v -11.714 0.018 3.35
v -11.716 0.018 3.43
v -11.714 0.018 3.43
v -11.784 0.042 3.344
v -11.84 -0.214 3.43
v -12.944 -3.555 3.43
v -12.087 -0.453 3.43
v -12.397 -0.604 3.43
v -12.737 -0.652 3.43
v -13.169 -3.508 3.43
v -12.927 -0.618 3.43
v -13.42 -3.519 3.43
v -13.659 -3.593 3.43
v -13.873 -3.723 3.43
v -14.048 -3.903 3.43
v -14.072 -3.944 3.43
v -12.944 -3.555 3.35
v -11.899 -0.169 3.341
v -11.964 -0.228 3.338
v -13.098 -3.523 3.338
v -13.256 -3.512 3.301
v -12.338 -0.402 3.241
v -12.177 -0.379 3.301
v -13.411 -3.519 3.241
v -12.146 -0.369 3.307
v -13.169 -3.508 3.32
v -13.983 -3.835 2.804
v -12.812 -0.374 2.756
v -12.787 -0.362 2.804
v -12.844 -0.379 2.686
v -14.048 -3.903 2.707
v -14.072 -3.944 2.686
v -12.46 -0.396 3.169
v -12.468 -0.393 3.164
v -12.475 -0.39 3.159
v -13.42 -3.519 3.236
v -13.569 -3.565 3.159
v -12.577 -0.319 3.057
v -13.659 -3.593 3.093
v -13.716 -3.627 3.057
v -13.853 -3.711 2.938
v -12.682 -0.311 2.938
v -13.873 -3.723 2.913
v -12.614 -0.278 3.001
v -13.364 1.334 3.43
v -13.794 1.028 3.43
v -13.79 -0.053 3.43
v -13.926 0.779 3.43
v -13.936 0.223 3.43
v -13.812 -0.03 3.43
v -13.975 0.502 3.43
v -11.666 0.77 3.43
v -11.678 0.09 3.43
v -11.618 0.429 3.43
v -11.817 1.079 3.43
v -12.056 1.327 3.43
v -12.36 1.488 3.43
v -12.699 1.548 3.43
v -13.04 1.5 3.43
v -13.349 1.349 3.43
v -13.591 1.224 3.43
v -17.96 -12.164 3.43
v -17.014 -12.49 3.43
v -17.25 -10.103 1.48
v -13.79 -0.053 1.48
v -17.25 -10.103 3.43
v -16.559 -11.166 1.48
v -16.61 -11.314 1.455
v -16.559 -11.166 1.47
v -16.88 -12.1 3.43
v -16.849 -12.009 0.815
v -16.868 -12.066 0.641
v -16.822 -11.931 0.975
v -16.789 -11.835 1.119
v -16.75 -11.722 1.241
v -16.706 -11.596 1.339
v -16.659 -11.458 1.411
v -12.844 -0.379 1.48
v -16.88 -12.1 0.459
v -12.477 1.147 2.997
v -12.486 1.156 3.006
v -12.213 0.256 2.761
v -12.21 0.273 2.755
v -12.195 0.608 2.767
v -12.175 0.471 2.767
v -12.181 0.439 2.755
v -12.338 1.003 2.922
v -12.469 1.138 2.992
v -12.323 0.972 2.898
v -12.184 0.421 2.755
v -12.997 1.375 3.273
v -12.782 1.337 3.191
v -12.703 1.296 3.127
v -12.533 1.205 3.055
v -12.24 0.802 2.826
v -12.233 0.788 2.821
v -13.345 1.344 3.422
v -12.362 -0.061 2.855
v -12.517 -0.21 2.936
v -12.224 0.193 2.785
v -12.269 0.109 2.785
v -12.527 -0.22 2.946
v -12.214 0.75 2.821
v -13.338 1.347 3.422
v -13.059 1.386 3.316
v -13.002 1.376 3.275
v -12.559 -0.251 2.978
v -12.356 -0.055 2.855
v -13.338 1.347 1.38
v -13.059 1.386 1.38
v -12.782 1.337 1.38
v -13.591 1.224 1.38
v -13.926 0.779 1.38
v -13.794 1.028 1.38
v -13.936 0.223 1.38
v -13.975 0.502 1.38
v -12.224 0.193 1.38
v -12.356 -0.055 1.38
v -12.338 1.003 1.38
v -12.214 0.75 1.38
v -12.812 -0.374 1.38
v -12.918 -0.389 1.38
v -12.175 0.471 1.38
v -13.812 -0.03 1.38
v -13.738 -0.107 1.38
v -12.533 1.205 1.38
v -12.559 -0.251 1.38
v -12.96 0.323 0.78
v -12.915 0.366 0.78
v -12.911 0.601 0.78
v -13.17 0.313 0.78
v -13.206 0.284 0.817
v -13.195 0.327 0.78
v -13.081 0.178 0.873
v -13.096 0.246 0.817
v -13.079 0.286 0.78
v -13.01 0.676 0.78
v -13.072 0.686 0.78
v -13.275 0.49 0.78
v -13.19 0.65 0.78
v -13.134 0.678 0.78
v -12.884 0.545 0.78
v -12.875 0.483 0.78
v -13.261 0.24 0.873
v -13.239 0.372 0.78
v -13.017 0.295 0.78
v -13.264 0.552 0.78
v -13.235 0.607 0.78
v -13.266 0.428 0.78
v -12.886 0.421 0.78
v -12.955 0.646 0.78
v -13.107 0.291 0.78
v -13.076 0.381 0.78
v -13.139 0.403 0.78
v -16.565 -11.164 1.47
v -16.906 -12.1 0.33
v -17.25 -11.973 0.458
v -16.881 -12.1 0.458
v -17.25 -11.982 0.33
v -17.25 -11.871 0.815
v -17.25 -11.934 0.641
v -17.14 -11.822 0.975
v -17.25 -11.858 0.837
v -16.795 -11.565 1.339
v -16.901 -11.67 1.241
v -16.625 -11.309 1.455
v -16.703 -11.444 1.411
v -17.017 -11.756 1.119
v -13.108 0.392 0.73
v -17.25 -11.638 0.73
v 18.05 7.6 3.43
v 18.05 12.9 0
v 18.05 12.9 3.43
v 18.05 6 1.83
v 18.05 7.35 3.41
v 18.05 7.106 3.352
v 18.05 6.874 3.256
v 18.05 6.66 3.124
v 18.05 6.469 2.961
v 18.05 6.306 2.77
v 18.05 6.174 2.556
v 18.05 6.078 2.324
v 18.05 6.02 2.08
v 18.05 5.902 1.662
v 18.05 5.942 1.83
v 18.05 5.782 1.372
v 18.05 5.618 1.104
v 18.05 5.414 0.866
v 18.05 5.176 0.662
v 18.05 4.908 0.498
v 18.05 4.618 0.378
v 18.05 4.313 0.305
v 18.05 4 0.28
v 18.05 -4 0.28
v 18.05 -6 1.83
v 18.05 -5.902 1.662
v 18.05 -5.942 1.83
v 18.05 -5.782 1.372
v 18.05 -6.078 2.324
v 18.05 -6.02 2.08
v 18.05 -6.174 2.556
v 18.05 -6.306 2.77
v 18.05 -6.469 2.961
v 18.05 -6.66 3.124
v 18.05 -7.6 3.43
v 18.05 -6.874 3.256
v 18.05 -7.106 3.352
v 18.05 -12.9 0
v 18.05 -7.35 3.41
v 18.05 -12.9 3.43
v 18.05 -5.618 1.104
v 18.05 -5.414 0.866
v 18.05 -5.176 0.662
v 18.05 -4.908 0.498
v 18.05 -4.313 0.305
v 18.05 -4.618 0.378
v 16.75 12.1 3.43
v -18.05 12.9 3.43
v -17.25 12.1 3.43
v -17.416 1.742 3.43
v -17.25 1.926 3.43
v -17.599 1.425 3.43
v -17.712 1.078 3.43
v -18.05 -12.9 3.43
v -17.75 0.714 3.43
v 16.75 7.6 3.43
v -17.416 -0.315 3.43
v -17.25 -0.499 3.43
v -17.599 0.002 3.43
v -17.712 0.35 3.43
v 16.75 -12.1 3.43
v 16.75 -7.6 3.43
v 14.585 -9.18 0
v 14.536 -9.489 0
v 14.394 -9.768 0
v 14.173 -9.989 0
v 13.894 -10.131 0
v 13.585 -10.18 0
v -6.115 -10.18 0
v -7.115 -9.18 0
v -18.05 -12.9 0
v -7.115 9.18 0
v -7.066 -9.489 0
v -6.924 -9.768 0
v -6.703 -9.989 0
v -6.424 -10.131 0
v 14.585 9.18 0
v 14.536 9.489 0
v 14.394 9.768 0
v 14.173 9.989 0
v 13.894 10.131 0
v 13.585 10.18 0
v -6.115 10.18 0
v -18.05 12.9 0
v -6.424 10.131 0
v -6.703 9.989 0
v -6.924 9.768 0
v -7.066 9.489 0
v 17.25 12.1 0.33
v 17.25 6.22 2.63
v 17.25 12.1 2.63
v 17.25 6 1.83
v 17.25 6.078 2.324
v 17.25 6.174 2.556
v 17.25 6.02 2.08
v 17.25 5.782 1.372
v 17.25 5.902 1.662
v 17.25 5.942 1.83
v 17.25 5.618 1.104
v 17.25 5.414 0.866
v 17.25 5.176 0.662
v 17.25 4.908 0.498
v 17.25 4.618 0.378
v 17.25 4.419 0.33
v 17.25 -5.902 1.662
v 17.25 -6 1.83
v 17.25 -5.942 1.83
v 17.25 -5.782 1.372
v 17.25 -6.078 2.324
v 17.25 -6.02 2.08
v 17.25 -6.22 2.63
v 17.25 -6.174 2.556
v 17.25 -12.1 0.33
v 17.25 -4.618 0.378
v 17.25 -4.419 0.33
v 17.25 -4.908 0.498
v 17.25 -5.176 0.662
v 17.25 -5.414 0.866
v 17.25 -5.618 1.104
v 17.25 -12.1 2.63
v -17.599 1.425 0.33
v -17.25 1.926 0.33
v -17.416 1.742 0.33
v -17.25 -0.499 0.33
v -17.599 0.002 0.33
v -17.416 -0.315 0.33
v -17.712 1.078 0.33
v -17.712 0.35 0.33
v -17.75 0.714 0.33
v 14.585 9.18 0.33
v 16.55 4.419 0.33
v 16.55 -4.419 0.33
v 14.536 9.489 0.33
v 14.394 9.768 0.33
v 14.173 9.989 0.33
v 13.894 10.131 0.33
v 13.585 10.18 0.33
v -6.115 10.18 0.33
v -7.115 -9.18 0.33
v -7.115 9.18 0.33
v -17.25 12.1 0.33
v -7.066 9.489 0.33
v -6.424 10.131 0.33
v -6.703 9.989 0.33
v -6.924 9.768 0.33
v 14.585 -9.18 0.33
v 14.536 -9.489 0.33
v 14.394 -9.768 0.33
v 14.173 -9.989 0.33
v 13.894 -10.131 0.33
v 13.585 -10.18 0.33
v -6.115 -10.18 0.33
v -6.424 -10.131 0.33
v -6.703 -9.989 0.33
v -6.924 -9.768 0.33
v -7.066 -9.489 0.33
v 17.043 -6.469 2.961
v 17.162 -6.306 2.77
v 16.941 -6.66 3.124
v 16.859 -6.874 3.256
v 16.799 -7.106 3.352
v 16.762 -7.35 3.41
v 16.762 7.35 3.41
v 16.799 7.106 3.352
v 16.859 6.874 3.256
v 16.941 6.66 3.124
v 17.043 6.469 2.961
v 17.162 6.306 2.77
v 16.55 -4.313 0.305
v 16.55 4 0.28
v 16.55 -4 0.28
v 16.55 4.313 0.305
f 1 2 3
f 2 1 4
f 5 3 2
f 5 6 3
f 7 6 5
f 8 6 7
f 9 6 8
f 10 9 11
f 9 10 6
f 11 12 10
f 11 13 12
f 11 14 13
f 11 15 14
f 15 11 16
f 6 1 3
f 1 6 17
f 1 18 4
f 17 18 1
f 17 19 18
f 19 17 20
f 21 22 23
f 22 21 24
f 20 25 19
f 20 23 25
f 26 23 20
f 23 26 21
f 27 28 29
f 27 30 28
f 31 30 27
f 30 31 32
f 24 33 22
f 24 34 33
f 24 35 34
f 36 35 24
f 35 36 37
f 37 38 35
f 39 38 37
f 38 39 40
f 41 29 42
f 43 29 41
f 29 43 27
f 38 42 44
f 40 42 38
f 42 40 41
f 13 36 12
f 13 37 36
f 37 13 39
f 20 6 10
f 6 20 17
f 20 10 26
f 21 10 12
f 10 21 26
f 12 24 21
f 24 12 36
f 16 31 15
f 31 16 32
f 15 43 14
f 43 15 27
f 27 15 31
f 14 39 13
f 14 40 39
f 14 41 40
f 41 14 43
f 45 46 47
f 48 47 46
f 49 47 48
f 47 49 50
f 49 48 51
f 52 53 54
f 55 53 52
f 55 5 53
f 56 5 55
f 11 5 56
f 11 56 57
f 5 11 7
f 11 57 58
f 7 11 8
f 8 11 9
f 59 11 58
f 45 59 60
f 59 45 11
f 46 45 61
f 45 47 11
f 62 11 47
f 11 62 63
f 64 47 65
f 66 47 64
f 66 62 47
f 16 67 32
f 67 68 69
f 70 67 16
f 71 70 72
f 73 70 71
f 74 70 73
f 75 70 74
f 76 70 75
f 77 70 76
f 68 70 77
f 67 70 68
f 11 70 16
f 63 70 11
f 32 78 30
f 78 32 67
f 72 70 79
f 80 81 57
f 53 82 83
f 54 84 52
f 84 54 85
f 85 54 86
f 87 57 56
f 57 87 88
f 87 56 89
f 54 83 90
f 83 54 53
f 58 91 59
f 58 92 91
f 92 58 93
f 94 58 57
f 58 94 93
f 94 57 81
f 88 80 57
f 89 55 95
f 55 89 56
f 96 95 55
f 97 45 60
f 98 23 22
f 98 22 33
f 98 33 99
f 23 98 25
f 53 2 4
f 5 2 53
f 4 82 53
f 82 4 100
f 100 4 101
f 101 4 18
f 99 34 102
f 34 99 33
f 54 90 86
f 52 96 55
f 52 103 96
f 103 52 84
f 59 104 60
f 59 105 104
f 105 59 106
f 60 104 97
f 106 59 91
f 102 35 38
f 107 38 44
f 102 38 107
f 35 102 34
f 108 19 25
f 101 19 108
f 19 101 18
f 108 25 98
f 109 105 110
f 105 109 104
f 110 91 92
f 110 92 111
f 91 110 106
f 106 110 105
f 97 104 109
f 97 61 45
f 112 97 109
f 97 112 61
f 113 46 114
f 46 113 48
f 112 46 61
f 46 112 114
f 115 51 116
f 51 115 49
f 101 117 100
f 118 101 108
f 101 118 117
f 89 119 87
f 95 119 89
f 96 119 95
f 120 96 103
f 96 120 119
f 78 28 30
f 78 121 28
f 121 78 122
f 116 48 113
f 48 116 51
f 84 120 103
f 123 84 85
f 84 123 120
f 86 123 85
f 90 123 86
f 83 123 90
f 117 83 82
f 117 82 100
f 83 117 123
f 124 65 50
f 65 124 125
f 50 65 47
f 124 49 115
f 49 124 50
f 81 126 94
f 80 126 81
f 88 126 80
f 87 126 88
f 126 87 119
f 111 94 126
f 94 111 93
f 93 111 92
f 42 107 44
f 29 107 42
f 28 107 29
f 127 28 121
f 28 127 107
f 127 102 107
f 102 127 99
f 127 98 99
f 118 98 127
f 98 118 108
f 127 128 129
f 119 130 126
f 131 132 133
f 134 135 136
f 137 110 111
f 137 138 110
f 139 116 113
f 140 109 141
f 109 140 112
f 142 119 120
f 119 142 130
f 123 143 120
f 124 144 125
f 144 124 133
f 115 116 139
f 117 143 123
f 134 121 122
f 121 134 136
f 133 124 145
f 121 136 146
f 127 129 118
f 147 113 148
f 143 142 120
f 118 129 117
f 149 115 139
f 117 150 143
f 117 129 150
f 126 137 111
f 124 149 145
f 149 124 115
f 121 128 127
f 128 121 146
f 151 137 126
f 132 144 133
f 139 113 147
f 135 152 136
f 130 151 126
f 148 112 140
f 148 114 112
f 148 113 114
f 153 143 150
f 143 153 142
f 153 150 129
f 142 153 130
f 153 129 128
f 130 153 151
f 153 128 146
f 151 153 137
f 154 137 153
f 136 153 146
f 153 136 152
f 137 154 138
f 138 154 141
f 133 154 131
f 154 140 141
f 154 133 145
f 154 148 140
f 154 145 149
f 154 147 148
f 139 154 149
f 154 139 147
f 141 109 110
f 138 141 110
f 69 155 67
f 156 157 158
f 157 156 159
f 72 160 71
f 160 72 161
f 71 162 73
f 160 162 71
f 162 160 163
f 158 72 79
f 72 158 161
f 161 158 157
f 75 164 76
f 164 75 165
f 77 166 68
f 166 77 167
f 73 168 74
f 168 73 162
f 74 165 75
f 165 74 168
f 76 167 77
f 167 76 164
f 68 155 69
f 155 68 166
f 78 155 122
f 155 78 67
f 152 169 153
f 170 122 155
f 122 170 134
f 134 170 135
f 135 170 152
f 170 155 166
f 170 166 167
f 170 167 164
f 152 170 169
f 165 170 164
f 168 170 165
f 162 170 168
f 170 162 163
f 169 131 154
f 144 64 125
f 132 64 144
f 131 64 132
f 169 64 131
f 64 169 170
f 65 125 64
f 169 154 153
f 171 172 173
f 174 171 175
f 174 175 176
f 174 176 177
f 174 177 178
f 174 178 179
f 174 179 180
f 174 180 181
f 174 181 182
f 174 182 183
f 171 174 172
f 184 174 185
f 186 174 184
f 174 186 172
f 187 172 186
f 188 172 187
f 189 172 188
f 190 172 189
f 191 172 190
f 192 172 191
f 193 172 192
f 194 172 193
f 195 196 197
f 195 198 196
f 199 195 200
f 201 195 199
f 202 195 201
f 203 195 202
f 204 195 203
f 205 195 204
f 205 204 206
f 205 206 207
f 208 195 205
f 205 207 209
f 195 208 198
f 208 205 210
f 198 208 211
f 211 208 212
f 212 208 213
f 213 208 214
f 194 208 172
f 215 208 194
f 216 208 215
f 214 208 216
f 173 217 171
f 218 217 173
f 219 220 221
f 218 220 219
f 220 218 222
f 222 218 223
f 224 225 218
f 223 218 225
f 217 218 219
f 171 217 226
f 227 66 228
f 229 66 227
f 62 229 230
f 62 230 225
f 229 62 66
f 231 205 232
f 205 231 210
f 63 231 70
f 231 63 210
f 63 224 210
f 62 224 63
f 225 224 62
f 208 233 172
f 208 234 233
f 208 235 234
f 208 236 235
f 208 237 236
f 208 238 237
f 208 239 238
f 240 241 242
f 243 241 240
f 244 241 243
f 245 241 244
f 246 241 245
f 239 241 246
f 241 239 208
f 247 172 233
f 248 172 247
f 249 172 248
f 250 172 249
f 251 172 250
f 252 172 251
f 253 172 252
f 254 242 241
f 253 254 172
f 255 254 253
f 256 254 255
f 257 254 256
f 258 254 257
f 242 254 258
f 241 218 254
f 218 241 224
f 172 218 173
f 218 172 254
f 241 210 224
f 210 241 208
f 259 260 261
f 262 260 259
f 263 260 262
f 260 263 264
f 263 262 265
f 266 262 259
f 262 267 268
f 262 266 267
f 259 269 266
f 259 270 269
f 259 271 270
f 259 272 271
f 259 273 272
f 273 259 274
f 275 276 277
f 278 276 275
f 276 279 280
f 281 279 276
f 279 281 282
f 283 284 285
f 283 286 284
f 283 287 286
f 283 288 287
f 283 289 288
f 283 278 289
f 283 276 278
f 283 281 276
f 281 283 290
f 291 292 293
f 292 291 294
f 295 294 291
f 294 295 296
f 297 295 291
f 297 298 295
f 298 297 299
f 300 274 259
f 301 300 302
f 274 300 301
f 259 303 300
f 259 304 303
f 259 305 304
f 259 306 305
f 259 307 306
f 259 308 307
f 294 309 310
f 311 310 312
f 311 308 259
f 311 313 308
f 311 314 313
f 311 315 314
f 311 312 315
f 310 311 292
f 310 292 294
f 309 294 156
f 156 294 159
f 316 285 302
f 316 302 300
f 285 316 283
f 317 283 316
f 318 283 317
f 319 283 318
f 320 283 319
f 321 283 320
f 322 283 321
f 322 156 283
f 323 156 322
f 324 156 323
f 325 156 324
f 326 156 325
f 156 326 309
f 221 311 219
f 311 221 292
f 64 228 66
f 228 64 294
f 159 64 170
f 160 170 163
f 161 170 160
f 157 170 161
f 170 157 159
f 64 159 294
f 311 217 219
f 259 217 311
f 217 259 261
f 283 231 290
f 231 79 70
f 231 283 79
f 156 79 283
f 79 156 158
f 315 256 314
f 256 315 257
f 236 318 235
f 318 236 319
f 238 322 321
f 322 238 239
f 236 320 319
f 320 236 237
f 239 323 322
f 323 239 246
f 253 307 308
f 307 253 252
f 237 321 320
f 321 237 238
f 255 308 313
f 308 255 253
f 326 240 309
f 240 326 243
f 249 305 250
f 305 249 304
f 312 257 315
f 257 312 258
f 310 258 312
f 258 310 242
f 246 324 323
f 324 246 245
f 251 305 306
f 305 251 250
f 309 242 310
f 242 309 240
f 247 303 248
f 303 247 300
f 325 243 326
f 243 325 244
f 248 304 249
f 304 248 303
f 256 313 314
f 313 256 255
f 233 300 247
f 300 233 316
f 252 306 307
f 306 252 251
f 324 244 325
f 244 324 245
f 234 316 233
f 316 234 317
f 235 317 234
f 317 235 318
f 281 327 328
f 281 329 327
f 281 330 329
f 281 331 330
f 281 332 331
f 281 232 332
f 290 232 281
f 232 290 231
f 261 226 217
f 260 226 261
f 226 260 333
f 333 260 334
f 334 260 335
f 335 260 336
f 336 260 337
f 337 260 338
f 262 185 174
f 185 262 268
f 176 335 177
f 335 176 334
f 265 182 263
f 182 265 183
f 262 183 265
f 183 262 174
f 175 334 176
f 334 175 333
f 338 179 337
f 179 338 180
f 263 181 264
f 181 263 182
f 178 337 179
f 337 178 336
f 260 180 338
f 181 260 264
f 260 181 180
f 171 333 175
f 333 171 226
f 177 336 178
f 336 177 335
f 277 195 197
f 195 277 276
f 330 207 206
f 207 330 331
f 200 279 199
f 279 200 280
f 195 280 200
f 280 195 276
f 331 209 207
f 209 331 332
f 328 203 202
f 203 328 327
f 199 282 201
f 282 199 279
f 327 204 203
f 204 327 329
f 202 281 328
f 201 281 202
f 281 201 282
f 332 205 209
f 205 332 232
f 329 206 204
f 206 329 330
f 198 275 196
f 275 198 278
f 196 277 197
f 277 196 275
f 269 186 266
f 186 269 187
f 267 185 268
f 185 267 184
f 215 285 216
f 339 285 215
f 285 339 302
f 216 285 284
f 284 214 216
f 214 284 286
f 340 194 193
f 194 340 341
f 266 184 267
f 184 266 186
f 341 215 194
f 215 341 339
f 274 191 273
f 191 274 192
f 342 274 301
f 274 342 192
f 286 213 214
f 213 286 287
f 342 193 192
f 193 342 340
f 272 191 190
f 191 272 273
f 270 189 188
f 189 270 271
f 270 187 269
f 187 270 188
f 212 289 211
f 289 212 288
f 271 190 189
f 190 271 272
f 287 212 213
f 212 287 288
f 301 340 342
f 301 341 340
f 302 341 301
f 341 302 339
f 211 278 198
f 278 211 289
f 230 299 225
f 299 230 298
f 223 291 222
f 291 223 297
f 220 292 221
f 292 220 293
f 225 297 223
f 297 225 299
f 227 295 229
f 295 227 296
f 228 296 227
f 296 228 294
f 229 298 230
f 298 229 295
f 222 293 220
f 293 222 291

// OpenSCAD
////////////////////////////////////////////////////////////////
// SD Card holder
// By Nuno João from https://EmbeddedDreams.com
// Released 2020 under Creative Commons 3.0
//
// This creates a compact SD card holder "box" with spring
// that can secure an SD card. Care was taken in order to
// make it work even when printing with low tolerances.
// See the end of the file for usage.
//

// Parameters. These defaults should cover all normal
// cases and there should be no need to change them
// unless you want to adapt for another card format
// or want ticher walls.

cSDCardDx = 32;
cSDCardDy = 24;
cSDCardDz = 2.1;
cSDCardGap = 0.2;           // Gap between card and holder
cSDCardPlanePad = 0.8;      // Exterior holder wall thickness
cZDetachGap = 0.40;         // Gap from spring to "ground"
cSDCardBackthickness = 0.28;
cSDCardSpringLen = 2.3;     // Distance between card top and holder wall, on spring side
cSpringLen = (cSDCardDy + cSDCardGap) * 0.56;
cSpringThickness = 1.0;
cSpringAngle = 19;

// Precalcs

cSDCardPocketDx = cSDCardDx + cSDCardSpringLen + cSDCardGap;
cSDCardPocketDy = cSDCardDy + cSDCardGap;
cSDCardPocketDz = cSDCardDz * 1.5;
cBlockDx = cSDCardPocketDx + 2 * cSDCardPlanePad;
cBlockDy = cSDCardPocketDy + 2 * cSDCardPlanePad;
cBlockDz = cSDCardPocketDz + cSDCardBackthickness;


function GetSDCardHolderWidth() = cBlockDy;

function GetSDCardHolderLength() = cBlockDx;

function GetSDCardHolderHeight() = cBlockDz;



module semisphere (diameter, fn = 40)  {
    difference()  {
        sphere(d = diameter, $fn = fn);
        d = diameter + 0.0;
        translate([0, 0, diameter/2])
            cube([d, d, d], true);
    }
}


module triprism (leng)  {
    linear_extrude(height = leng)
        polygon(points = [[0,0], [0.5,0], [0,-0.8]],
                paths = [[0,1,2,0]], convexity = 10);
}


// Centered where the 90º corner would be placed.
module RoundChamferMold (radius = 1, width = 1, nonRoundLen = 0)  {
    scale([radius, radius, width])
        difference()  {
            cube([1 - nonRoundLen, 1 - nonRoundLen, 1], center = true);
            translate([(1 - nonRoundLen) / 2, (1 - nonRoundLen) / 2, 0])
                cylinder(h = 1.1, d = 1, center = true, $fn = 40);
        }
}


module Spring (leng, rot, thickness, dz)  {
    ofstZ = 0.1;
    ballPointDiam = thickness * 1.8;
    t2 = thickness / 2;
    rotate([0, 0, 90 - rot])  {
        translate([leng/2 + thickness/2, 0, 0])  {
            // Spring body
            translate([-leng/2, -thickness/2, cZDetachGap*2])
                cube([leng, thickness, dz - cZDetachGap*2]);
            // Top, SDCard holder w/ round chamfer and tip round end 
            difference()  {
                translate([leng/2 - leng/3/2, -ballPointDiam/2, dz - ballPointDiam/2/2-0.09])
                    rotate([90, 90, -90])
                        RoundChamferMold(thickness*2, leng/3, 0.46);
                translate([2, -ballPointDiam/2 - thickness/2 - 0.06, dz*3/4 - 0.2])
                    cylinder(h = dz/4 + 0.4, d = thickness*2, $fn = 25);
            }
            translate([leng/2 + 0.08, -0.35, dz - cZDetachGap*3])
                cylinder(h = cZDetachGap*3, r1 = 0.1, r2 = ballPointDiam/2 + 0.2, $fn = 20);
            translate([leng/2, 0, cZDetachGap*2 - ofstZ])
                cylinder(h = dz - cZDetachGap*2 + ofstZ, d = ballPointDiam, $fn = 20);
            // Conical bottom
            translate([leng/2, 0, ofstZ])
                cylinder(h = cZDetachGap*2 - ofstZ*2, r1 = ofstZ*2, r2 = ballPointDiam/2, $fn = 20);
        }
        // Bottom double side chamfer on the spring body
        translate([0.4, 0, cZDetachGap - 0.1])
            rotate([90, 0, 90])
                linear_extrude(leng)
                    polygon(points = [ [-t2,t2], [t2,t2], [0,-t2*0.5] ]);

        translate([cSDCardPlanePad + 0.3, 0, cZDetachGap*2 - thickness/4])
            rotate([180, 90, 90])
                scale([1.2, 1, 1])
                    RoundChamferMold(thickness*2, thickness, 0.2);
    }
}


module MainBlock (backHole = 1)  {
    difference()  {
        cube([cBlockDx, cBlockDy, cBlockDz]);
        translate([cSDCardPlanePad, cSDCardPlanePad, cSDCardBackthickness + 0.05])
            cube([cSDCardPocketDx, cSDCardPocketDy, cSDCardPocketDz]);

        // Remove a little more material from the base plane
        if (backHole == 1)  {
            cHoleDy = cSDCardPocketDy * 0.8;
            cHoleDx = cSDCardPocketDx * 0.6;
            translate([(cBlockDx - cHoleDx) / 2 * 1.55,
                       (cBlockDy - cHoleDy+1) / 2, -0.1])  {
                // Corner rounded square
                linear_extrude(height = cSDCardBackthickness * 2)
                    offset(r = 1, $fn = 20)
                        square([cHoleDx - 1, cHoleDy - 1]);
            }
        }
    }
}


module SDCard (ofstX = 0, ofstY = 0, zangle = 0, fingerGap = 12, backHole = 1)  {
    translate([ofstX, ofstY, 0])
    rotate([0, 0, zangle])
    translate([-GetSDCardHolderLength()/2, -GetSDCardHolderWidth()/2, 0])  {
        // Spring
        translate([cSDCardPlanePad / 2, 0.1, cSDCardBackthickness + cZDetachGap])
            Spring(cSpringLen, rot = cSpringAngle, thickness = cSpringThickness,
                    dz = cSDCardPocketDz - cZDetachGap);
        difference()  {
            union()  {
                // Holder main block
                MainBlock(backHole);
                // Triangular edge to lock the card in place
                translate([cBlockDx - cSDCardPlanePad, 0, cBlockDz])
                    rotate([90, 0, 180])
                        triprism(cBlockDy);
            }
            // Open a gap for a finger to pull the SD card out
            wallLenMinusFGap = cBlockDy - fingerGap;
            if (fingerGap != 0)  {
                cOffset = 2;
                cOffset2 = cOffset / 2;
                gapCenter = cBlockDy / 2;
                translate([cBlockDx - 1.5, gapCenter,
                            cBlockDz/2 + cSDCardBackthickness + cOffset])
                    rotate([0, 90, 0])
                    linear_extrude(height = 4)
                        offset(r = cOffset, $fn = 40)
                            square([cBlockDz, fingerGap - cOffset*2], center = true);
            }
            endWallCenterDx = cBlockDx - cSDCardPlanePad;
            nonGapLen = wallLenMinusFGap/2 + cSDCardPlanePad;
            chamferRadius = 3.2;
            translate([endWallCenterDx, cBlockDy - wallLenMinusFGap/2, cBlockDz])
                rotate([0,90,0]) RoundChamferMold(chamferRadius, cSDCardPlanePad*2.5);
            translate([endWallCenterDx, wallLenMinusFGap/2, cBlockDz])
                rotate([0,90,180]) RoundChamferMold(chamferRadius, cSDCardPlanePad*2.5);
            // Open a small space on the wall for the spring tip to have a
            // little more travel range.
            cSpringTipPocketDiam = 3.5;
            translate([cSpringTipPocketDiam/2 + cSDCardPlanePad - 0.5,
                       cSpringLen * cos(cSpringAngle) + 0.8,
                       cSDCardPocketDz/2 + cSDCardBackthickness + 0.1])
                cylinder(h = cSDCardPocketDz + 0.1, d = cSpringTipPocketDiam, center = true, $fn = 30);
        }
    }
}


// Draw 2 micro SD cards occupying the area of a single SDCard
// @@TODO
module MicroSDCard ()  {
    cube([cSDCardDx, cSDCardDy, cSDCardDz], true);
}


/// Test stuff

//RoundChamferMold(10);
//rotate([0, 90, 0]) RoundChamferMold(2, 3);

//Spring (cSpringLen, rot = 0, thickness = cSpringThickness, dz = cSDCardPocketDz - cZDetachGap);
SDCard(0, 0, 0);
//SDCard(0, GetSDCardHolderWidth(), 0);
//SDCard(15 + GetSDCardHolderWidth(), 0, 90);
//SDCard(15 + GetSDCardHolderWidth() * 2, 0, 90);

for (col = [-1:1])  {
//    SDCard(0, col * GetSDCardHolderDy(), 0);
}
